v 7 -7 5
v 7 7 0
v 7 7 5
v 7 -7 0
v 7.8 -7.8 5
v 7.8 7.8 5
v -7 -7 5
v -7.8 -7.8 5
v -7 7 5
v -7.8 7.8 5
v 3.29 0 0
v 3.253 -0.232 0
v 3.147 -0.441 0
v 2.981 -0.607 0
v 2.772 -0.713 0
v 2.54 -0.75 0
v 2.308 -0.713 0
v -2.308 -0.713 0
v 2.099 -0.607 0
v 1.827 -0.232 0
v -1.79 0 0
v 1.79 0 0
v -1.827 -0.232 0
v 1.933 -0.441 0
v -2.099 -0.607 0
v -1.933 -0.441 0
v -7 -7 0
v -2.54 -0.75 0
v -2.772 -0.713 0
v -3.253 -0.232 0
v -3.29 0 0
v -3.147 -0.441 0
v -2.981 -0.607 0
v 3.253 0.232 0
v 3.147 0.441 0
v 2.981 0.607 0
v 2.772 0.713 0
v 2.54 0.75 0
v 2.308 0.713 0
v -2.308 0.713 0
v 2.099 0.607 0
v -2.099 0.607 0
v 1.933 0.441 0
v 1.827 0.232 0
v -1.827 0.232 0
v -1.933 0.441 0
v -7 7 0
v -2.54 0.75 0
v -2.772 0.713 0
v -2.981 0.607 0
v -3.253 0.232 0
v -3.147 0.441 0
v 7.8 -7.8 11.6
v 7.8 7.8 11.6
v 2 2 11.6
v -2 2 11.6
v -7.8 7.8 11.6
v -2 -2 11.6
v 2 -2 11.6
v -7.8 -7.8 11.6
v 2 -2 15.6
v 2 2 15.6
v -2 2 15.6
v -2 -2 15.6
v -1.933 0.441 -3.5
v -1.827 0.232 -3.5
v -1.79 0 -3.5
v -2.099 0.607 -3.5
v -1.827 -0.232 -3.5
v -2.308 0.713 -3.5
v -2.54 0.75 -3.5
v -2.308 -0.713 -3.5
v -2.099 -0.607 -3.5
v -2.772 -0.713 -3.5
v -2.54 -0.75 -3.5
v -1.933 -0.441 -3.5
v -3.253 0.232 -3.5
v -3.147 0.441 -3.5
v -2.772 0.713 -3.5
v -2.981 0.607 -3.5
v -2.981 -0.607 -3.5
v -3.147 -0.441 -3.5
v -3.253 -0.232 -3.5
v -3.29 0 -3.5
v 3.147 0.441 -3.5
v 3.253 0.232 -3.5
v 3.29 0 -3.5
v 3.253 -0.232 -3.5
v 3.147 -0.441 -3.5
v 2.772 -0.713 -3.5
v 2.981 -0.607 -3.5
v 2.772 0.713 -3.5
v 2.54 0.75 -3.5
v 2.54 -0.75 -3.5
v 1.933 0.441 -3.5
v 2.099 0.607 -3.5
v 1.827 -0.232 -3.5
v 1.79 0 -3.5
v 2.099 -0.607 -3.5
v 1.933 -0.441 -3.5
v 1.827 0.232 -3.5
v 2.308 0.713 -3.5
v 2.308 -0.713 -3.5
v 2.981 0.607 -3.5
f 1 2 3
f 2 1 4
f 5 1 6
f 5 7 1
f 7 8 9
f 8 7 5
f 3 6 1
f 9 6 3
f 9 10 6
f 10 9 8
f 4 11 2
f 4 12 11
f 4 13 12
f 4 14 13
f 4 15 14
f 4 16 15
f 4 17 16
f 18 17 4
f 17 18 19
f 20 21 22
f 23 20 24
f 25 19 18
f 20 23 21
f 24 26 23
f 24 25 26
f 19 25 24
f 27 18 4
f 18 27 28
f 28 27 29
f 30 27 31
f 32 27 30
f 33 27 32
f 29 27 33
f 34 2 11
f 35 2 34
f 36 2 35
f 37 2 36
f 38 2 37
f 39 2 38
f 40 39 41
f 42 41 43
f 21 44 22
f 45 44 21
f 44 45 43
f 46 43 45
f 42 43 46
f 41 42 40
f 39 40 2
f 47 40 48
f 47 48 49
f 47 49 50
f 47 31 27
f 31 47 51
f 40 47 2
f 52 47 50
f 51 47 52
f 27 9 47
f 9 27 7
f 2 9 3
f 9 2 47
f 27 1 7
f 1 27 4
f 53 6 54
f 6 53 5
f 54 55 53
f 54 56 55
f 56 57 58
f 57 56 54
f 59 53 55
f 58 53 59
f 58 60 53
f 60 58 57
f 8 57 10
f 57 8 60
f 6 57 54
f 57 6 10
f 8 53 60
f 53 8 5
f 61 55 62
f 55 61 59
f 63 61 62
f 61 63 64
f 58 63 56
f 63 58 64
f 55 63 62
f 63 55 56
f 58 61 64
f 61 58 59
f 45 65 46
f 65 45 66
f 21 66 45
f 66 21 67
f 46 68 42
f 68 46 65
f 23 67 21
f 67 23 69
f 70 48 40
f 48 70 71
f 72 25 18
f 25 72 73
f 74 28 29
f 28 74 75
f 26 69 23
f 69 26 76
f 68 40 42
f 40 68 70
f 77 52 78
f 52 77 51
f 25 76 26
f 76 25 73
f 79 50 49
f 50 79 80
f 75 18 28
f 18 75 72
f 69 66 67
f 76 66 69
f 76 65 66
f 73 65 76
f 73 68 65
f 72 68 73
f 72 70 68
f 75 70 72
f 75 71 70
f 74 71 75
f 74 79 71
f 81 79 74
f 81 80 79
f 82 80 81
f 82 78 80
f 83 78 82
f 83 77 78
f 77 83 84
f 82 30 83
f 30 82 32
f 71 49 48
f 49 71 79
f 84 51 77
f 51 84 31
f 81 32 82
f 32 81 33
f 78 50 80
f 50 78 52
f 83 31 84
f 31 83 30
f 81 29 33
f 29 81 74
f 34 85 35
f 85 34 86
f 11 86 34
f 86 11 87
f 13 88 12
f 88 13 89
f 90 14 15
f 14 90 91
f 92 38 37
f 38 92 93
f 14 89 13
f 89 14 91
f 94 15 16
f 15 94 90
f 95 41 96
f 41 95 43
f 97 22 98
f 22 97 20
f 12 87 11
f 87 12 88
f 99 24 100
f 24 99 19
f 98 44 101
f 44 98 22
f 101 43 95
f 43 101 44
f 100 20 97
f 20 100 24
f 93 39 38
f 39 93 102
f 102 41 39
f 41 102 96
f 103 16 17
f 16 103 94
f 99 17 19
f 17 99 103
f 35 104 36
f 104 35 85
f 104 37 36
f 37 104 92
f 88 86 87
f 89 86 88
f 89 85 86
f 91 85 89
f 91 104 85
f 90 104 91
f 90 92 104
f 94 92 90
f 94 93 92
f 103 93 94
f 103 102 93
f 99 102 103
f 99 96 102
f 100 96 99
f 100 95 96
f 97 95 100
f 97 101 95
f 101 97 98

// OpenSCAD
// Cherry MX utility modules
// Lightweight dimensional primitives for keyboard design prototyping.
// All dimensions in mm.

// ============================================
// Helpers / defaults
// ============================================

/* [Parts] */
part = "mx_switch_3d"; // [mx_footprint_2d, mx_footprint_3d, mx_footprint_stab_2d, mx_footprint_stab_3d, mx_stabilizer_foot_2d, mx_stabilizer_foot_3d, mx_switch_3d, mx_keycap_3d, mx_wide_keycap_3d]

/* [Preview Parameters] */
key_u = 2; // [1:0.25:7]
preview_with_alignment_holes = false;
preview_stabilizer_span = 0; // 0 = auto by key_u
preview_footprint_thickness = 1.6; // [0.8:0.1:6] 3D preview extrusion height for 2D footprints

/* [Hidden] */
KEY_U = 19.05; // 1u key pitch
function inch(x) = x * 25.4;



// Common Cherry-style stabilizer center spacing by key width (approx).
// Override with an explicit value if your hardware differs.
function cherry_stabilizer_span(u) =
	(u <= 2) ? 23.88 :
	(u <= 2.25) ? 28.58 :
	(u <= 2.5) ? 33.34 :
	(u <= 2.75) ? 38.10 :
	(u <= 6.25) ? 100.00 :
	114.30; // ~7u

// ============================================
// 2D footprints (for plate cut geometry)
// ============================================

module cherry_mx_footprint_2d(
	cutout_size=14,
	corner_radius=0.5,
	alignment_hole_d=1.7,
	alignment_hole_y=5.08,
	with_alignment_holes=false
) {
	// 2D plate opening for a single Cherry MX switch.
	union() {
		if (corner_radius > 0) {
			offset(r=corner_radius)
				offset(delta=-corner_radius)
					square([cutout_size, cutout_size], center=true);
		} else {
			square([cutout_size, cutout_size], center=true);
		}

		if (with_alignment_holes) {
			translate([0, alignment_hole_y])
				circle(d=alignment_hole_d, $fn=32);
			translate([0, -alignment_hole_y])
				circle(d=alignment_hole_d, $fn=32);
		}
	}
}

module cherry_mx_stabilizer_foot_2d(
	neck_len = 1.525,  // thin neck length from the central square edge
	neck_h   = 9.40,   // neck (waist) full height  (~2 x 4.70)
	tab_len  = 6.75,   // tab body length
	tab_h    = 12.03,  // tab body full height    (~0.484")
	clip_h   = 3.23,   // outer clip prong height at each corner
	notch_x  = 0.825,  // outer-edge notch inset (~0.032")
	root_overlap = 1   // mm buried into the central square for a clean union
) {
	// A single stabilizer foot in local coordinates:
	//   x = 0             -> neck root (attaches to the central switch cutout)
	//   x = neck_len+tab_len -> outer edge of the foot
	// Symmetric about the X axis. Silhouette (outward): thin neck -> fat tab
	// -> notched outer edge leaving top/bottom clip prongs. Focus feature work here.
	hn   = neck_h / 2;            // neck half-height (~4.70)
	ht   = tab_h / 2;            // tab half-height (~6.015)
	length = neck_len + tab_len; // outer edge x
	yclip  = ht - clip_h;        // y where the outer notch steps in (~2.785)

	polygon(points=[
		[-root_overlap, hn],
		[neck_len, hn],
		[neck_len, ht],
		[length, ht],
		[length, yclip],
		[length - notch_x, yclip],
		[length - notch_x, -yclip],
		[length, -yclip],
		[length, -ht],
		[neck_len, -ht],
		[neck_len, -hn],
		[-root_overlap, -hn]
	]);
}

module cherry_mx_footprint_with_stabilizers_2d(
	u=2,
	cutout_size=14,
	stabilizer_span=undef,  // full width A (mm); undef => foot's native width
	corner_radius=0.5
) {
	// Composed cutout: central Cherry MX footprint unioned with a
	// stabilizer foot on each side.
	central_half = cutout_size / 2;      // neck root position
	tab_len      = 6.75;
	// Stretch the neck so the total width hits A, if provided.
	neck_len = is_undef(stabilizer_span)
		? 1.525
		: max(stabilizer_span / 2 - central_half - tab_len, 1.525);

	union() {
		cherry_mx_footprint_2d(cutout_size=cutout_size, corner_radius=corner_radius);

		translate([central_half, 0])
			cherry_mx_stabilizer_foot_2d(neck_len=neck_len, tab_len=tab_len);

		translate([-central_half, 0])
			mirror([1, 0, 0])
				cherry_mx_stabilizer_foot_2d(neck_len=neck_len, tab_len=tab_len);
	}
}

module cherry_mx_footprint_3d(
	thickness=1.6,
	cutout_size=14,
	corner_radius=0.5,
	alignment_hole_d=1.7,
	alignment_hole_y=5.08,
	with_alignment_holes=false
) {
	linear_extrude(height=thickness)
		cherry_mx_footprint_2d(
			cutout_size=cutout_size,
			corner_radius=corner_radius,
			alignment_hole_d=alignment_hole_d,
			alignment_hole_y=alignment_hole_y,
			with_alignment_holes=with_alignment_holes
		);
}

module cherry_mx_footprint_with_stabilizers_3d(
	thickness=1.6,
	u=2,
	cutout_size=14,
	stabilizer_span=undef,
	corner_radius=0.5
) {
	linear_extrude(height=thickness)
		cherry_mx_footprint_with_stabilizers_2d(
			u=u,
			cutout_size=cutout_size,
			stabilizer_span=stabilizer_span,
			corner_radius=corner_radius
		);
}

// ============================================
// 3D components
// ============================================

module cherry_mx_switch_3d(
	lower_w=14,
	lower_h=5,
	upper_w=15.6,
	upper_h=6.6,
	stem_w=4,
	stem_h=4,
	stem_rise=4,
	pin_d=1.5,
	pin_h=3.5
) {
	// Simple visual/fit model of a Cherry MX switch.
	// Origin: center XY at switch center, Z=0 on bottom of switch body.
	union() {
		// Lower housing
		translate([0, 0, lower_h/2])
			cube([lower_w, lower_w, lower_h], center=true);

		// Upper housing
		translate([0, 0, lower_h + upper_h/2])
			cube([upper_w, upper_w, upper_h], center=true);

		// Simplified stem tower
		translate([0, 0, lower_h + upper_h + stem_rise/2])
			cube([stem_w, stem_w, stem_rise], center=true);

		// Simplified two electrical pins under body
		translate([-2.54, 0, -pin_h/2])
			cylinder(d=pin_d, h=pin_h, center=true, $fn=20);
		translate([ 2.54, 0, -pin_h/2])
			cylinder(d=pin_d, h=pin_h, center=true, $fn=20);
	}
}

module cherry_mx_keycap_3d(
	u=1,
	key_pitch=KEY_U,
	cap_depth=18,
	cap_height=10,
	top_scale=0.88,
	wall=1.2,
	dish_depth=0.8
) {
	// Simplified keycap shell for a 1u-style keycap.
	// For wide keys, use cherry_mx_wide_keycap_3d().
	cap_width = u * key_pitch - 1.0;

	difference() {
		// Outer shell
		linear_extrude(height=cap_height, scale=[top_scale, top_scale])
			square([cap_width, cap_depth], center=true);

		// Hollow interior
		translate([0, 0, wall])
			linear_extrude(height=max(cap_height - wall, 0.1), scale=[top_scale, top_scale])
				square([max(cap_width - 2*wall, 0.1), max(cap_depth - 2*wall, 0.1)], center=true);

		// Top dish (simple spherical scoop)
		translate([0, 0, cap_height - dish_depth + cap_width])
			sphere(r=cap_width, $fn=64);
	}
}

module cherry_mx_wide_keycap_3d(
	u=2,
	key_pitch=KEY_U,
	cap_depth=18,
	cap_height=10,
	top_scale=0.90,
	wall=1.4,
	stabilizer_span=undef,
	stabilizer_stem_d=5.2,
	stabilizer_stem_h=4
) {
	// Wide keycap (2u+) with added stabilizer stem placeholders.
	stab_span = is_undef(stabilizer_span) ? cherry_stabilizer_span(u) : stabilizer_span;
	cap_width = u * key_pitch - 1.0;

	union() {
		cherry_mx_keycap_3d(
			u=u,
			key_pitch=key_pitch,
			cap_depth=cap_depth,
			cap_height=cap_height,
			top_scale=top_scale,
			wall=wall
		);

		// Underside stabilizer stems (simple cylinders)
		translate([-stab_span/2, 0, stabilizer_stem_h/2])
			cylinder(d=stabilizer_stem_d, h=stabilizer_stem_h, center=true, $fn=40);
		translate([ stab_span/2, 0, stabilizer_stem_h/2])
			cylinder(d=stabilizer_stem_d, h=stabilizer_stem_h, center=true, $fn=40);
	}
}

// ============================================
// Customizer render dispatch
// ============================================

if (part == "mx_footprint_2d") {
	cherry_mx_footprint_2d(with_alignment_holes=preview_with_alignment_holes);
} else if (part == "mx_footprint_3d") {
	cherry_mx_footprint_3d(
		thickness=preview_footprint_thickness,
		with_alignment_holes=preview_with_alignment_holes
	);
} else if (part == "mx_footprint_stab_2d") {
	cherry_mx_footprint_with_stabilizers_2d(
		u=key_u,
		stabilizer_span=(preview_stabilizer_span <= 0 ? undef : preview_stabilizer_span)
	);
} else if (part == "mx_footprint_stab_3d") {
	cherry_mx_footprint_with_stabilizers_3d(
		thickness=preview_footprint_thickness,
		u=key_u,
		stabilizer_span=(preview_stabilizer_span <= 0 ? undef : preview_stabilizer_span)
	);
} else if (part == "mx_stabilizer_foot_2d") {
	cherry_mx_stabilizer_foot_2d();
} else if (part == "mx_stabilizer_foot_3d") {
	linear_extrude(height=preview_footprint_thickness)
		cherry_mx_stabilizer_foot_2d();
} else if (part == "mx_switch_3d") {
	cherry_mx_switch_3d();
} else if (part == "mx_keycap_3d") {
	cherry_mx_keycap_3d(u=key_u);
} else if (part == "mx_wide_keycap_3d") {
	cherry_mx_wide_keycap_3d(
		u=max(key_u, 2),
		stabilizer_span=(preview_stabilizer_span <= 0 ? undef : preview_stabilizer_span)
	);
}
